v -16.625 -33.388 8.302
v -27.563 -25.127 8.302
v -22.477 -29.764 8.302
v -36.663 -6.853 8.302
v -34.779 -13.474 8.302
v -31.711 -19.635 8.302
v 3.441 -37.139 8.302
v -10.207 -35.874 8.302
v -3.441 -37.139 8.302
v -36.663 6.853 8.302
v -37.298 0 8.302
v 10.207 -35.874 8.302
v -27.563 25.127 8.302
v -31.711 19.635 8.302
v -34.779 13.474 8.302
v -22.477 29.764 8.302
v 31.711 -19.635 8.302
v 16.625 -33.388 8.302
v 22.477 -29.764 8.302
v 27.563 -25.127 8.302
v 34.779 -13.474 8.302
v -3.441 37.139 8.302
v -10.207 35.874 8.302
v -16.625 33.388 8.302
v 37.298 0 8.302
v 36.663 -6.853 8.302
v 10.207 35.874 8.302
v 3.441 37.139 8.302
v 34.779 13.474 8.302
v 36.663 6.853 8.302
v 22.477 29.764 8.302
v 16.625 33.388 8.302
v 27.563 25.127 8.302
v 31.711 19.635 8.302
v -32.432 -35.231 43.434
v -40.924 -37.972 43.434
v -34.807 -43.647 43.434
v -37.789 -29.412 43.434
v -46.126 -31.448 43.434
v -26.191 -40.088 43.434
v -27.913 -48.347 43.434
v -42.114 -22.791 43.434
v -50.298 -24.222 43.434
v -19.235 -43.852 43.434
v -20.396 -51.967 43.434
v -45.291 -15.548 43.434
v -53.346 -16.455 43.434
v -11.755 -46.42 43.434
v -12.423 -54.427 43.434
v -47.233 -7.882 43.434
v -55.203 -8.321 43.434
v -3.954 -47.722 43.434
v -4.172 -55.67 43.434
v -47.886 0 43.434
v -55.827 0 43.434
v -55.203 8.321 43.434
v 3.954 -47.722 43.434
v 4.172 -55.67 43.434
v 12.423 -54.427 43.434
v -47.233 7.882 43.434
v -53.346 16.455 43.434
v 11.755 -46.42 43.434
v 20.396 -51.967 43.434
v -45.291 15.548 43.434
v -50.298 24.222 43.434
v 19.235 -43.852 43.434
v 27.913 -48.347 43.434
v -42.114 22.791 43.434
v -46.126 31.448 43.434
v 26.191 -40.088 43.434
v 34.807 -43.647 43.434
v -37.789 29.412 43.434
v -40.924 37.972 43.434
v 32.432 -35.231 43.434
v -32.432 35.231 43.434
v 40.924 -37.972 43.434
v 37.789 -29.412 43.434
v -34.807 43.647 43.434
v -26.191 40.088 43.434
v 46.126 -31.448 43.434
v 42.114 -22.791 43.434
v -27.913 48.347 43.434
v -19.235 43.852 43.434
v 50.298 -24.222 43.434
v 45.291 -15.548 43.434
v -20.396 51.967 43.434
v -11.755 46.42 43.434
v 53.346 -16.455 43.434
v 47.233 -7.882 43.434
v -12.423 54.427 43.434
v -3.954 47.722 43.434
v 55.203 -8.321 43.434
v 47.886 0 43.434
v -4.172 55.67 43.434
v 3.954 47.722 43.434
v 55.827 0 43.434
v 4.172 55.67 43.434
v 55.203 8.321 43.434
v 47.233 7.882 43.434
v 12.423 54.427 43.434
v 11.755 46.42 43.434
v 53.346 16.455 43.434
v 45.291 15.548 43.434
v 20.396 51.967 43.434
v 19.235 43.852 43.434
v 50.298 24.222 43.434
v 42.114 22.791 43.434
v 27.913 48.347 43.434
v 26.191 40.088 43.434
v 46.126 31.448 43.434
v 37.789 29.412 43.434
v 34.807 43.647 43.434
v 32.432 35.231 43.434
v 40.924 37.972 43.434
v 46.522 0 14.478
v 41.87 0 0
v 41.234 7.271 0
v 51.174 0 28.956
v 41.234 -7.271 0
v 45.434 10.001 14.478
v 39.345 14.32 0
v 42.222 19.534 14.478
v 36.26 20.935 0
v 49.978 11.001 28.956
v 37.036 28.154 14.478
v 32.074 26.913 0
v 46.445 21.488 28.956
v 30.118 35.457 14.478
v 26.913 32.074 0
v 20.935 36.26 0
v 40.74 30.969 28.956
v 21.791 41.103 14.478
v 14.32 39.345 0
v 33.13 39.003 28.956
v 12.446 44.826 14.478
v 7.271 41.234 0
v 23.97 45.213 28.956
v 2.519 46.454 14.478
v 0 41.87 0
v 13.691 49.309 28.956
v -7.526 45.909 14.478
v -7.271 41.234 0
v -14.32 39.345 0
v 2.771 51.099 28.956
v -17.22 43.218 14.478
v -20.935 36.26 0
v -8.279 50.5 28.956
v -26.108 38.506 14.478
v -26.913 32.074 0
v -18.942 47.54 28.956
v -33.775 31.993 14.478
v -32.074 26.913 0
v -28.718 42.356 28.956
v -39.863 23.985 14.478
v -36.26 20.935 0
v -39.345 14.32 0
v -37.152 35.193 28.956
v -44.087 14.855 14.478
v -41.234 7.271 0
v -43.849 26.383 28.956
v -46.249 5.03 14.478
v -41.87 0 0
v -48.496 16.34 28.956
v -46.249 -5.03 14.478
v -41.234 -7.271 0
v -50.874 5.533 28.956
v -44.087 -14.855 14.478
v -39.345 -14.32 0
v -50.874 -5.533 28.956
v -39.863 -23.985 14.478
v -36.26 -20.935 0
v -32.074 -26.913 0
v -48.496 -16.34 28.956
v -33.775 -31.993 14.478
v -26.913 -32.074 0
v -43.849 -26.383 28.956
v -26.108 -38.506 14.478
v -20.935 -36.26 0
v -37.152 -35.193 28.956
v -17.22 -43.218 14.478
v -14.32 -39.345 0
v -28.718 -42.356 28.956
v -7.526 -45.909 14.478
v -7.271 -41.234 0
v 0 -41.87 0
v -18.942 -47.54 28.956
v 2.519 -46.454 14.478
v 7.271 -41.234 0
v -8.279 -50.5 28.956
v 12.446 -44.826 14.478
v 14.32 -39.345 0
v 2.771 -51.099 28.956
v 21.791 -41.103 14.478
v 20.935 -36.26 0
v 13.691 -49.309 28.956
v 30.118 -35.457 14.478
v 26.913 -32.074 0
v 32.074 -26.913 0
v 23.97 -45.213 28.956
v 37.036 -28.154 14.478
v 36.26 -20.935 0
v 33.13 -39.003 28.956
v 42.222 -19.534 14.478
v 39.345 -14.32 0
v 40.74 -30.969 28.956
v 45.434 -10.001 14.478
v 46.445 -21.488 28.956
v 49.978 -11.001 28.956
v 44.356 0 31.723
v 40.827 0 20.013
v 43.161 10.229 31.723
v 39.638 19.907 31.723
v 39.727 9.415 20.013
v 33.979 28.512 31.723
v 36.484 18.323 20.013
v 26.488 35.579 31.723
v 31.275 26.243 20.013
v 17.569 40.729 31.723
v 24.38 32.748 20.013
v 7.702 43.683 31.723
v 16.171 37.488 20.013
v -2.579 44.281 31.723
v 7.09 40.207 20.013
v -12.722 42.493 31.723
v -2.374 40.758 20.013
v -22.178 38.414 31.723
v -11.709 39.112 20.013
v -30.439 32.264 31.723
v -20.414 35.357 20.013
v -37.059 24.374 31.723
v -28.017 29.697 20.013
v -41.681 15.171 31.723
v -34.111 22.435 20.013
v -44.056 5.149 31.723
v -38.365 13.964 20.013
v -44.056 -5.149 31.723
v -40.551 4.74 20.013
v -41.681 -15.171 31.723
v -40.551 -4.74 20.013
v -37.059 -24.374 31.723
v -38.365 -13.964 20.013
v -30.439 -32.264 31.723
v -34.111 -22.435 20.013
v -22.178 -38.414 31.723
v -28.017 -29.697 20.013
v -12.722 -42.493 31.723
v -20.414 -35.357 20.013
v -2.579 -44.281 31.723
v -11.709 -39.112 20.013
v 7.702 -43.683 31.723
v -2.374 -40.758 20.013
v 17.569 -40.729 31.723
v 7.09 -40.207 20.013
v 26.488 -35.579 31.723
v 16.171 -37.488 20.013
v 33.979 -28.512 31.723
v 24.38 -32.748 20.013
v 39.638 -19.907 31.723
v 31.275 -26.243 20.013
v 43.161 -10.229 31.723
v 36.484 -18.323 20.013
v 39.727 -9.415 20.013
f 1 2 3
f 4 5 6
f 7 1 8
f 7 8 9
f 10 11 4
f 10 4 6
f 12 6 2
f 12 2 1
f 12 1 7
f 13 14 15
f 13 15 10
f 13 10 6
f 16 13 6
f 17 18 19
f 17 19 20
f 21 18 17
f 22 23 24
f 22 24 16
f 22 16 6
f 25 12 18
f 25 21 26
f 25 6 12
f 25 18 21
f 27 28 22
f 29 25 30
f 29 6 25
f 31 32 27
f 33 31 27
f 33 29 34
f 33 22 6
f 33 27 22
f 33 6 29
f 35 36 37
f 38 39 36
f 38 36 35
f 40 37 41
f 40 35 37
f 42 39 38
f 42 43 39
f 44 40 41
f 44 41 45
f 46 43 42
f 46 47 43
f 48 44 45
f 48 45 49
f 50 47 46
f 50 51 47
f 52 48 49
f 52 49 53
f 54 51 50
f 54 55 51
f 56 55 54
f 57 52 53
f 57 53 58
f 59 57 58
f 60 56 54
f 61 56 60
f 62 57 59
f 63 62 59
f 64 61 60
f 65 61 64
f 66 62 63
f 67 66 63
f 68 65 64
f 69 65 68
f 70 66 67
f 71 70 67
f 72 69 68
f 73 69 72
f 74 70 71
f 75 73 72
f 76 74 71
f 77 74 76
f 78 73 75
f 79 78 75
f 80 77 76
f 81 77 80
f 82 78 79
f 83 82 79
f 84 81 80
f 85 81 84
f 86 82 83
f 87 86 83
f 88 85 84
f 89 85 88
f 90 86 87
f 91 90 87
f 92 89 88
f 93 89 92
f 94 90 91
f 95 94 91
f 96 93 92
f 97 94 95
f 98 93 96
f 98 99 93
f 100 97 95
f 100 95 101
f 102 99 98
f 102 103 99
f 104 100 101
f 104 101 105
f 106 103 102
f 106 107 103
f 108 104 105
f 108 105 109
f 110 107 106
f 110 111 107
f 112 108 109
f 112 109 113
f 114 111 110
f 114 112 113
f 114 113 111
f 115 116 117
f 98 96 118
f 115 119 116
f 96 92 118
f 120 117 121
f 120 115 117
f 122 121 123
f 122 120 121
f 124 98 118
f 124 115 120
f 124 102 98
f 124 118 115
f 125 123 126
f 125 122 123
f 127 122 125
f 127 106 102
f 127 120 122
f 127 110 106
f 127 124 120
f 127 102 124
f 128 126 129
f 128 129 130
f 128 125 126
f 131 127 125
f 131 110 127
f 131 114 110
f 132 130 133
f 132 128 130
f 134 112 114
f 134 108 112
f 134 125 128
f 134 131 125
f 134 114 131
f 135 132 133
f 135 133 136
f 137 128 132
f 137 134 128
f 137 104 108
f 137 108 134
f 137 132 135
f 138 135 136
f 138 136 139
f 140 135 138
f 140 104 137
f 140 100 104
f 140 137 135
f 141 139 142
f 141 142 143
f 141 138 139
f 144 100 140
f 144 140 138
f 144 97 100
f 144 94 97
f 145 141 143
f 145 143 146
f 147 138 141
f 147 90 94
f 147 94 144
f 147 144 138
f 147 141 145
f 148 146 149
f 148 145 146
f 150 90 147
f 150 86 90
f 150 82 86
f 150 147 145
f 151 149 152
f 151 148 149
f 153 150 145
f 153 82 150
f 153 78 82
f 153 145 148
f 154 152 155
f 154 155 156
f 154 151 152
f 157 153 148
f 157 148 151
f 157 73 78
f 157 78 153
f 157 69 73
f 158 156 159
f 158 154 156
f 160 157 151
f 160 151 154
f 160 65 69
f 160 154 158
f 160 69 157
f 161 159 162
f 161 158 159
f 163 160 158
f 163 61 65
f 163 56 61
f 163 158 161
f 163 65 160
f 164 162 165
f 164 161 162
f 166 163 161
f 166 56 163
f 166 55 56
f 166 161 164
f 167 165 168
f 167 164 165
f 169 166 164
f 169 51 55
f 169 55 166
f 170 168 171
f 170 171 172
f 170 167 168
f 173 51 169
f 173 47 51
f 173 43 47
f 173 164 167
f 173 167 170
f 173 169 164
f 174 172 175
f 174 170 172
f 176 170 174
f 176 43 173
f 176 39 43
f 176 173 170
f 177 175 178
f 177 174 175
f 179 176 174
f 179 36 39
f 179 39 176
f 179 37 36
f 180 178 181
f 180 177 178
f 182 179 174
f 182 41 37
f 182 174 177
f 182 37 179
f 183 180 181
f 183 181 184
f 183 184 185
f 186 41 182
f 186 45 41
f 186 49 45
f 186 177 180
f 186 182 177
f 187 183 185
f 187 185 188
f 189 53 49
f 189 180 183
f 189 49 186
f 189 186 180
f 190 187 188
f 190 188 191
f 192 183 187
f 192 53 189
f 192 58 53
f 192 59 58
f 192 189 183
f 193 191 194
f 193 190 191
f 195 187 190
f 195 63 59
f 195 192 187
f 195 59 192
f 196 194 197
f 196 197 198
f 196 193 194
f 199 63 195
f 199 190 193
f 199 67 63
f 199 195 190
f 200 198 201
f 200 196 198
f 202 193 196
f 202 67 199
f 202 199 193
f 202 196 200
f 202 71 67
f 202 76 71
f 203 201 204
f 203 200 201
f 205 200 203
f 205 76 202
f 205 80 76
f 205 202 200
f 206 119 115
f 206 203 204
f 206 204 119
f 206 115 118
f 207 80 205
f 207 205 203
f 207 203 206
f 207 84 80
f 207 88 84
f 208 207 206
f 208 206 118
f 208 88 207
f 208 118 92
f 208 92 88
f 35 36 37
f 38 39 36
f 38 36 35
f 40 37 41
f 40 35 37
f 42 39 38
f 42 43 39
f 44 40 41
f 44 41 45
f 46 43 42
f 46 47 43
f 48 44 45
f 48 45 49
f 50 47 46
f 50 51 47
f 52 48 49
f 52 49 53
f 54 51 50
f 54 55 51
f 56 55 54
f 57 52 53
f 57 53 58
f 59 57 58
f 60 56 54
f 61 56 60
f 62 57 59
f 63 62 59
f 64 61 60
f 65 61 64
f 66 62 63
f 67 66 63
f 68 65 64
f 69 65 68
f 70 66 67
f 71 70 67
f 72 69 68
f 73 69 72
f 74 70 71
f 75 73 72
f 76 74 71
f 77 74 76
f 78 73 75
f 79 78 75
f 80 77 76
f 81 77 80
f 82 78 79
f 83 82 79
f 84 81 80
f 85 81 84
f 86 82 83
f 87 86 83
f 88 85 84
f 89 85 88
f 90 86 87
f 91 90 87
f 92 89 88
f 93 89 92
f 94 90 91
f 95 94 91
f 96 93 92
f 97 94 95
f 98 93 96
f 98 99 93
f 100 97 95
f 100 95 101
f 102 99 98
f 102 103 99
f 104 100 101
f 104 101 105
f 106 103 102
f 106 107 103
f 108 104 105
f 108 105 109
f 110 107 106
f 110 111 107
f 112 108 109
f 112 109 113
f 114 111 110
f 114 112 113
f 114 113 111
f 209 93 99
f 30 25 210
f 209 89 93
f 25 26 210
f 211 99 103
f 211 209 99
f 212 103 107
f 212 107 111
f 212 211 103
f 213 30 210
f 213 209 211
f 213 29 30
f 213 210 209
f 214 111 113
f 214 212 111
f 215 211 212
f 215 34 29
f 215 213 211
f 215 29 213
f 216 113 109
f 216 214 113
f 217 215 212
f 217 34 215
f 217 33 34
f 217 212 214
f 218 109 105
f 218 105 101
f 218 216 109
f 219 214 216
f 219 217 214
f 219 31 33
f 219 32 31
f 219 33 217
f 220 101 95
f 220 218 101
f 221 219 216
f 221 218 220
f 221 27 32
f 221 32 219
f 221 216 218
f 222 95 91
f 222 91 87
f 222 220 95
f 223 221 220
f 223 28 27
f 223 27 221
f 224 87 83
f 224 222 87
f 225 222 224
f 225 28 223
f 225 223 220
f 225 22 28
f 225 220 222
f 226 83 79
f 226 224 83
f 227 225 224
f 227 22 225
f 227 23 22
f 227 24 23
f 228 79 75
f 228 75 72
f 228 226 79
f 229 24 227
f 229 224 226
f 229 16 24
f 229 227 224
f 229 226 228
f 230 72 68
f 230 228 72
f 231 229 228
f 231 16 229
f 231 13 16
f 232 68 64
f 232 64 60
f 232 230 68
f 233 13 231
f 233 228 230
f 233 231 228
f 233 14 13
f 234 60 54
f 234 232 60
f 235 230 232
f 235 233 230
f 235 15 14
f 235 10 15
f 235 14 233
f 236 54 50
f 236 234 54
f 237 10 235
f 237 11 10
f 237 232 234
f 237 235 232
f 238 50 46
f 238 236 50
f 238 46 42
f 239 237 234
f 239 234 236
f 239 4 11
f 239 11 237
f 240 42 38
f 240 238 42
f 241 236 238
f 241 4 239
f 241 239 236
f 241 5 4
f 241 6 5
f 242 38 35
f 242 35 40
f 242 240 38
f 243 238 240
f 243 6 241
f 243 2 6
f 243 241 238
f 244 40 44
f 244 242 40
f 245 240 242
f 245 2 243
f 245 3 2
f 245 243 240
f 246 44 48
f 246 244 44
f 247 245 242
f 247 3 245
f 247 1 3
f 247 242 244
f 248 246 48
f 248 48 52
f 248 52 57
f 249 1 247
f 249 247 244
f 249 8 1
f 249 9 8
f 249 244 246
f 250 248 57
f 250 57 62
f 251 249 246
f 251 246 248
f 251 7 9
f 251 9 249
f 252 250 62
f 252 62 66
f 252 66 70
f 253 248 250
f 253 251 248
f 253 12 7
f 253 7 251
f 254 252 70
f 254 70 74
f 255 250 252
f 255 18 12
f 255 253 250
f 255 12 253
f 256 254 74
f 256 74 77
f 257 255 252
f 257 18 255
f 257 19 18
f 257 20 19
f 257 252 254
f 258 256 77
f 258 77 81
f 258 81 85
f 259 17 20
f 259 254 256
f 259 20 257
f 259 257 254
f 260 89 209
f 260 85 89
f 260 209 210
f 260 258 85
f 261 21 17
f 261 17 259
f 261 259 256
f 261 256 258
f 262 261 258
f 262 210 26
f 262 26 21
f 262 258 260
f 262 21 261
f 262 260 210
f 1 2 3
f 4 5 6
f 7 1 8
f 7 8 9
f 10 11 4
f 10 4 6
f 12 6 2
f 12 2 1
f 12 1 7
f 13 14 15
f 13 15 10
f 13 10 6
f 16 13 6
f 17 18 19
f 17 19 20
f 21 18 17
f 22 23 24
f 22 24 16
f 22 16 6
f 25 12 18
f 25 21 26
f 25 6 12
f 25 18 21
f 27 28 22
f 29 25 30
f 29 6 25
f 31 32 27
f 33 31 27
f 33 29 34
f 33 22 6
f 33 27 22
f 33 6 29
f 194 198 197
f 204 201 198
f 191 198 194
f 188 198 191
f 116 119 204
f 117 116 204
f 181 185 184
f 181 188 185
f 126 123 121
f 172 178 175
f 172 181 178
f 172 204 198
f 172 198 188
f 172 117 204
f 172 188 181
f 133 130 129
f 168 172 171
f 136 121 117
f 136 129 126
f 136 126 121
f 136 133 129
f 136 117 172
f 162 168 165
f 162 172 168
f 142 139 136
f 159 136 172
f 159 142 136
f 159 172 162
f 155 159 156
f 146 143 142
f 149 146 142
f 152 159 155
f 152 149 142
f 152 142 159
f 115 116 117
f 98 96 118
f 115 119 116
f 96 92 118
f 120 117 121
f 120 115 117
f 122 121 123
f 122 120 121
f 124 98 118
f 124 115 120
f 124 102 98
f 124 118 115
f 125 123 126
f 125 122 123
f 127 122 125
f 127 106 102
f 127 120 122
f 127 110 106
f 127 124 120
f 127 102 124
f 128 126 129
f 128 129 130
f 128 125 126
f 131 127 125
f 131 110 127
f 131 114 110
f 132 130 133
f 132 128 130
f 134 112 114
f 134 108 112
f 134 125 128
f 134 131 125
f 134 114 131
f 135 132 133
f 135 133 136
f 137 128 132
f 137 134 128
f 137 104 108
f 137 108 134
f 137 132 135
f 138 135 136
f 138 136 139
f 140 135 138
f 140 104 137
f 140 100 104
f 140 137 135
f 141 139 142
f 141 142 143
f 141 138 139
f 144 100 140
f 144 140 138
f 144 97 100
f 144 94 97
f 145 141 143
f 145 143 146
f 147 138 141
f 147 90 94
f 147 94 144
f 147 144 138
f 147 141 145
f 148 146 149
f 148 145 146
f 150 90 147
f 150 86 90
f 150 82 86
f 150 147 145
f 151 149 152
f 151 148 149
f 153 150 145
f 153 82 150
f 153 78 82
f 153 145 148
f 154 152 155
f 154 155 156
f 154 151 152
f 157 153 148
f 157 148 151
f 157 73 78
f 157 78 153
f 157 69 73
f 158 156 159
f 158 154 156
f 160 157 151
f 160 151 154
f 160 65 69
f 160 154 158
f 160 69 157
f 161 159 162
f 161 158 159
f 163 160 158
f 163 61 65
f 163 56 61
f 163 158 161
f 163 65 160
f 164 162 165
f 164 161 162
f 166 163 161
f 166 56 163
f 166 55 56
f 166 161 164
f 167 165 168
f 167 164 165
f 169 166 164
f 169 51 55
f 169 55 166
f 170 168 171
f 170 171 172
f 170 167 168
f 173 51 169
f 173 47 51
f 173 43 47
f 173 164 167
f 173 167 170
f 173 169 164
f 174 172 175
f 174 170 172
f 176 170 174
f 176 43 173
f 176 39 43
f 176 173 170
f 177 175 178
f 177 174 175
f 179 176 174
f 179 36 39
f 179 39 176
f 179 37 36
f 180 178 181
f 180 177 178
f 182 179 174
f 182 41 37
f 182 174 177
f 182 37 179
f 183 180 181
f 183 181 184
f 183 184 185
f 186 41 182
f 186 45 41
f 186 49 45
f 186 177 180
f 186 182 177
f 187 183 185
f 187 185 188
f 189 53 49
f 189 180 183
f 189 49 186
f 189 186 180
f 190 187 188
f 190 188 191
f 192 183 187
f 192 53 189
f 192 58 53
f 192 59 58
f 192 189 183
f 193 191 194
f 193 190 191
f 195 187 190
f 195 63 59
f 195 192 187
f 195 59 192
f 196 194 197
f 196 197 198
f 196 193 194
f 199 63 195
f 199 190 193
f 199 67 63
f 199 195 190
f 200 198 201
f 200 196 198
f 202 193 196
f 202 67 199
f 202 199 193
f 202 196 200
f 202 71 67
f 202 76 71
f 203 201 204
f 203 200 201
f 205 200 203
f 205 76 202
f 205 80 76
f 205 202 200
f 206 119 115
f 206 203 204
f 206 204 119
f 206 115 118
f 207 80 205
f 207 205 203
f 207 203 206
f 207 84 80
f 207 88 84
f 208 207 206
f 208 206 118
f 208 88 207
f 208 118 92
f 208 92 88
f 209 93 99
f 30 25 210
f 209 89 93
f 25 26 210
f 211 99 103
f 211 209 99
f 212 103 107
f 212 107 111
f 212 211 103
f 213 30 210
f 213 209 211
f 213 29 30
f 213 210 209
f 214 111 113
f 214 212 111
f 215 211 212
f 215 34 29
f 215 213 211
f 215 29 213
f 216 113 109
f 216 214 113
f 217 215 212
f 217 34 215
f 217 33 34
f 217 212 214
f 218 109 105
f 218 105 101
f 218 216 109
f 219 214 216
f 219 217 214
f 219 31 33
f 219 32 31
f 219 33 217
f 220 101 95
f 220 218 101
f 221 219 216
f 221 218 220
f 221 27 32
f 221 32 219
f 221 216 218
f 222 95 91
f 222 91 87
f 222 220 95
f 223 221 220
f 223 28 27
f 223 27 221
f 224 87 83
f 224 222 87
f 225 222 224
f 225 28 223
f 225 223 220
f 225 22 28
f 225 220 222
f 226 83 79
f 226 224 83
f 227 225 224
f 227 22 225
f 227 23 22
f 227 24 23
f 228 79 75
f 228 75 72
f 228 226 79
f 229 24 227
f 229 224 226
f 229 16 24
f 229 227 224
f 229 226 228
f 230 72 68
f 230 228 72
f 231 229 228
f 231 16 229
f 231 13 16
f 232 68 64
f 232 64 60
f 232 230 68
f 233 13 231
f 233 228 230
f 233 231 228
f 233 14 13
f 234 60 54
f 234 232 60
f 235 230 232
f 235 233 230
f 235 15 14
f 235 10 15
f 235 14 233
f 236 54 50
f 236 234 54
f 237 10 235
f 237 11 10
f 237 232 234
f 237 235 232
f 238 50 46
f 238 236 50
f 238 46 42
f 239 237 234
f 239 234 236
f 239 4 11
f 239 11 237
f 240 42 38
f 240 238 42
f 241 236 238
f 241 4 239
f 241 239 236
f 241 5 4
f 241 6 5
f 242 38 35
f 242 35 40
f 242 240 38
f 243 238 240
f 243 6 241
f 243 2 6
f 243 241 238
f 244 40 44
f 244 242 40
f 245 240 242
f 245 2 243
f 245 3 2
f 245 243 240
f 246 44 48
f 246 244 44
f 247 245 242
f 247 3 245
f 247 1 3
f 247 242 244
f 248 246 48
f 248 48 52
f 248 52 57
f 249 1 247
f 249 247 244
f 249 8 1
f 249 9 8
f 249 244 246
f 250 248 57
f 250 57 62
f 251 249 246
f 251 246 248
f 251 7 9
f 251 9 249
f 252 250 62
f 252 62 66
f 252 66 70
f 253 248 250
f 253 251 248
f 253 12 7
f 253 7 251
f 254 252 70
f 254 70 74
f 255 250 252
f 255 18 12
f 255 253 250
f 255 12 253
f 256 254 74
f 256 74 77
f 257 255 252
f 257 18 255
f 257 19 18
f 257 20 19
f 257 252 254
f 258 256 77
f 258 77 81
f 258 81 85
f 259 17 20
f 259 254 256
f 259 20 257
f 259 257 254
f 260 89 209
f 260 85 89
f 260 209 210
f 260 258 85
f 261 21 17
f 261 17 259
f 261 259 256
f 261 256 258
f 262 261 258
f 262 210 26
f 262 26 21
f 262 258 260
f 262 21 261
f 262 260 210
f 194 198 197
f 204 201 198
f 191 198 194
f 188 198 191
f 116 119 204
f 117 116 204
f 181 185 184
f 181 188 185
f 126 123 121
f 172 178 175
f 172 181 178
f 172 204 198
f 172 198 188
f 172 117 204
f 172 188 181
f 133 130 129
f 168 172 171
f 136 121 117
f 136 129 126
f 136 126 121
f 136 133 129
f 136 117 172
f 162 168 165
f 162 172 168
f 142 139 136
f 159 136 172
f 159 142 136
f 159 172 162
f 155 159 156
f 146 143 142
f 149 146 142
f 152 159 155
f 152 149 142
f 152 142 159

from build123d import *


with BuildPart() as f1:
    # F0 (on Front) → F1 (revolve)
    with BuildSketch(Plane.XZ):
        Polygon((0, 8.30179), (0, 0), (41.869897, 0), (55.826526, 43.434002), (47.885686, 43.434002), (37.297893, 8.30179), align=None)
    revolve(axis=Axis((0, 0, 4.150895), (0, 0, 1)))


with BuildPart() as f2:
    # F0 (on Front) → F2 (revolve)
    with BuildSketch(Plane.XZ):
        Polygon((0, 8.30179), (0, 0), (41.869897, 0), (55.826526, 43.434002), (47.885686, 43.434002), (37.297893, 8.30179), align=None)
    revolve(axis=Axis((0, 0, 4.150895), (0, 0, 1)))


solid = Compound([f1.part, f2.part])
